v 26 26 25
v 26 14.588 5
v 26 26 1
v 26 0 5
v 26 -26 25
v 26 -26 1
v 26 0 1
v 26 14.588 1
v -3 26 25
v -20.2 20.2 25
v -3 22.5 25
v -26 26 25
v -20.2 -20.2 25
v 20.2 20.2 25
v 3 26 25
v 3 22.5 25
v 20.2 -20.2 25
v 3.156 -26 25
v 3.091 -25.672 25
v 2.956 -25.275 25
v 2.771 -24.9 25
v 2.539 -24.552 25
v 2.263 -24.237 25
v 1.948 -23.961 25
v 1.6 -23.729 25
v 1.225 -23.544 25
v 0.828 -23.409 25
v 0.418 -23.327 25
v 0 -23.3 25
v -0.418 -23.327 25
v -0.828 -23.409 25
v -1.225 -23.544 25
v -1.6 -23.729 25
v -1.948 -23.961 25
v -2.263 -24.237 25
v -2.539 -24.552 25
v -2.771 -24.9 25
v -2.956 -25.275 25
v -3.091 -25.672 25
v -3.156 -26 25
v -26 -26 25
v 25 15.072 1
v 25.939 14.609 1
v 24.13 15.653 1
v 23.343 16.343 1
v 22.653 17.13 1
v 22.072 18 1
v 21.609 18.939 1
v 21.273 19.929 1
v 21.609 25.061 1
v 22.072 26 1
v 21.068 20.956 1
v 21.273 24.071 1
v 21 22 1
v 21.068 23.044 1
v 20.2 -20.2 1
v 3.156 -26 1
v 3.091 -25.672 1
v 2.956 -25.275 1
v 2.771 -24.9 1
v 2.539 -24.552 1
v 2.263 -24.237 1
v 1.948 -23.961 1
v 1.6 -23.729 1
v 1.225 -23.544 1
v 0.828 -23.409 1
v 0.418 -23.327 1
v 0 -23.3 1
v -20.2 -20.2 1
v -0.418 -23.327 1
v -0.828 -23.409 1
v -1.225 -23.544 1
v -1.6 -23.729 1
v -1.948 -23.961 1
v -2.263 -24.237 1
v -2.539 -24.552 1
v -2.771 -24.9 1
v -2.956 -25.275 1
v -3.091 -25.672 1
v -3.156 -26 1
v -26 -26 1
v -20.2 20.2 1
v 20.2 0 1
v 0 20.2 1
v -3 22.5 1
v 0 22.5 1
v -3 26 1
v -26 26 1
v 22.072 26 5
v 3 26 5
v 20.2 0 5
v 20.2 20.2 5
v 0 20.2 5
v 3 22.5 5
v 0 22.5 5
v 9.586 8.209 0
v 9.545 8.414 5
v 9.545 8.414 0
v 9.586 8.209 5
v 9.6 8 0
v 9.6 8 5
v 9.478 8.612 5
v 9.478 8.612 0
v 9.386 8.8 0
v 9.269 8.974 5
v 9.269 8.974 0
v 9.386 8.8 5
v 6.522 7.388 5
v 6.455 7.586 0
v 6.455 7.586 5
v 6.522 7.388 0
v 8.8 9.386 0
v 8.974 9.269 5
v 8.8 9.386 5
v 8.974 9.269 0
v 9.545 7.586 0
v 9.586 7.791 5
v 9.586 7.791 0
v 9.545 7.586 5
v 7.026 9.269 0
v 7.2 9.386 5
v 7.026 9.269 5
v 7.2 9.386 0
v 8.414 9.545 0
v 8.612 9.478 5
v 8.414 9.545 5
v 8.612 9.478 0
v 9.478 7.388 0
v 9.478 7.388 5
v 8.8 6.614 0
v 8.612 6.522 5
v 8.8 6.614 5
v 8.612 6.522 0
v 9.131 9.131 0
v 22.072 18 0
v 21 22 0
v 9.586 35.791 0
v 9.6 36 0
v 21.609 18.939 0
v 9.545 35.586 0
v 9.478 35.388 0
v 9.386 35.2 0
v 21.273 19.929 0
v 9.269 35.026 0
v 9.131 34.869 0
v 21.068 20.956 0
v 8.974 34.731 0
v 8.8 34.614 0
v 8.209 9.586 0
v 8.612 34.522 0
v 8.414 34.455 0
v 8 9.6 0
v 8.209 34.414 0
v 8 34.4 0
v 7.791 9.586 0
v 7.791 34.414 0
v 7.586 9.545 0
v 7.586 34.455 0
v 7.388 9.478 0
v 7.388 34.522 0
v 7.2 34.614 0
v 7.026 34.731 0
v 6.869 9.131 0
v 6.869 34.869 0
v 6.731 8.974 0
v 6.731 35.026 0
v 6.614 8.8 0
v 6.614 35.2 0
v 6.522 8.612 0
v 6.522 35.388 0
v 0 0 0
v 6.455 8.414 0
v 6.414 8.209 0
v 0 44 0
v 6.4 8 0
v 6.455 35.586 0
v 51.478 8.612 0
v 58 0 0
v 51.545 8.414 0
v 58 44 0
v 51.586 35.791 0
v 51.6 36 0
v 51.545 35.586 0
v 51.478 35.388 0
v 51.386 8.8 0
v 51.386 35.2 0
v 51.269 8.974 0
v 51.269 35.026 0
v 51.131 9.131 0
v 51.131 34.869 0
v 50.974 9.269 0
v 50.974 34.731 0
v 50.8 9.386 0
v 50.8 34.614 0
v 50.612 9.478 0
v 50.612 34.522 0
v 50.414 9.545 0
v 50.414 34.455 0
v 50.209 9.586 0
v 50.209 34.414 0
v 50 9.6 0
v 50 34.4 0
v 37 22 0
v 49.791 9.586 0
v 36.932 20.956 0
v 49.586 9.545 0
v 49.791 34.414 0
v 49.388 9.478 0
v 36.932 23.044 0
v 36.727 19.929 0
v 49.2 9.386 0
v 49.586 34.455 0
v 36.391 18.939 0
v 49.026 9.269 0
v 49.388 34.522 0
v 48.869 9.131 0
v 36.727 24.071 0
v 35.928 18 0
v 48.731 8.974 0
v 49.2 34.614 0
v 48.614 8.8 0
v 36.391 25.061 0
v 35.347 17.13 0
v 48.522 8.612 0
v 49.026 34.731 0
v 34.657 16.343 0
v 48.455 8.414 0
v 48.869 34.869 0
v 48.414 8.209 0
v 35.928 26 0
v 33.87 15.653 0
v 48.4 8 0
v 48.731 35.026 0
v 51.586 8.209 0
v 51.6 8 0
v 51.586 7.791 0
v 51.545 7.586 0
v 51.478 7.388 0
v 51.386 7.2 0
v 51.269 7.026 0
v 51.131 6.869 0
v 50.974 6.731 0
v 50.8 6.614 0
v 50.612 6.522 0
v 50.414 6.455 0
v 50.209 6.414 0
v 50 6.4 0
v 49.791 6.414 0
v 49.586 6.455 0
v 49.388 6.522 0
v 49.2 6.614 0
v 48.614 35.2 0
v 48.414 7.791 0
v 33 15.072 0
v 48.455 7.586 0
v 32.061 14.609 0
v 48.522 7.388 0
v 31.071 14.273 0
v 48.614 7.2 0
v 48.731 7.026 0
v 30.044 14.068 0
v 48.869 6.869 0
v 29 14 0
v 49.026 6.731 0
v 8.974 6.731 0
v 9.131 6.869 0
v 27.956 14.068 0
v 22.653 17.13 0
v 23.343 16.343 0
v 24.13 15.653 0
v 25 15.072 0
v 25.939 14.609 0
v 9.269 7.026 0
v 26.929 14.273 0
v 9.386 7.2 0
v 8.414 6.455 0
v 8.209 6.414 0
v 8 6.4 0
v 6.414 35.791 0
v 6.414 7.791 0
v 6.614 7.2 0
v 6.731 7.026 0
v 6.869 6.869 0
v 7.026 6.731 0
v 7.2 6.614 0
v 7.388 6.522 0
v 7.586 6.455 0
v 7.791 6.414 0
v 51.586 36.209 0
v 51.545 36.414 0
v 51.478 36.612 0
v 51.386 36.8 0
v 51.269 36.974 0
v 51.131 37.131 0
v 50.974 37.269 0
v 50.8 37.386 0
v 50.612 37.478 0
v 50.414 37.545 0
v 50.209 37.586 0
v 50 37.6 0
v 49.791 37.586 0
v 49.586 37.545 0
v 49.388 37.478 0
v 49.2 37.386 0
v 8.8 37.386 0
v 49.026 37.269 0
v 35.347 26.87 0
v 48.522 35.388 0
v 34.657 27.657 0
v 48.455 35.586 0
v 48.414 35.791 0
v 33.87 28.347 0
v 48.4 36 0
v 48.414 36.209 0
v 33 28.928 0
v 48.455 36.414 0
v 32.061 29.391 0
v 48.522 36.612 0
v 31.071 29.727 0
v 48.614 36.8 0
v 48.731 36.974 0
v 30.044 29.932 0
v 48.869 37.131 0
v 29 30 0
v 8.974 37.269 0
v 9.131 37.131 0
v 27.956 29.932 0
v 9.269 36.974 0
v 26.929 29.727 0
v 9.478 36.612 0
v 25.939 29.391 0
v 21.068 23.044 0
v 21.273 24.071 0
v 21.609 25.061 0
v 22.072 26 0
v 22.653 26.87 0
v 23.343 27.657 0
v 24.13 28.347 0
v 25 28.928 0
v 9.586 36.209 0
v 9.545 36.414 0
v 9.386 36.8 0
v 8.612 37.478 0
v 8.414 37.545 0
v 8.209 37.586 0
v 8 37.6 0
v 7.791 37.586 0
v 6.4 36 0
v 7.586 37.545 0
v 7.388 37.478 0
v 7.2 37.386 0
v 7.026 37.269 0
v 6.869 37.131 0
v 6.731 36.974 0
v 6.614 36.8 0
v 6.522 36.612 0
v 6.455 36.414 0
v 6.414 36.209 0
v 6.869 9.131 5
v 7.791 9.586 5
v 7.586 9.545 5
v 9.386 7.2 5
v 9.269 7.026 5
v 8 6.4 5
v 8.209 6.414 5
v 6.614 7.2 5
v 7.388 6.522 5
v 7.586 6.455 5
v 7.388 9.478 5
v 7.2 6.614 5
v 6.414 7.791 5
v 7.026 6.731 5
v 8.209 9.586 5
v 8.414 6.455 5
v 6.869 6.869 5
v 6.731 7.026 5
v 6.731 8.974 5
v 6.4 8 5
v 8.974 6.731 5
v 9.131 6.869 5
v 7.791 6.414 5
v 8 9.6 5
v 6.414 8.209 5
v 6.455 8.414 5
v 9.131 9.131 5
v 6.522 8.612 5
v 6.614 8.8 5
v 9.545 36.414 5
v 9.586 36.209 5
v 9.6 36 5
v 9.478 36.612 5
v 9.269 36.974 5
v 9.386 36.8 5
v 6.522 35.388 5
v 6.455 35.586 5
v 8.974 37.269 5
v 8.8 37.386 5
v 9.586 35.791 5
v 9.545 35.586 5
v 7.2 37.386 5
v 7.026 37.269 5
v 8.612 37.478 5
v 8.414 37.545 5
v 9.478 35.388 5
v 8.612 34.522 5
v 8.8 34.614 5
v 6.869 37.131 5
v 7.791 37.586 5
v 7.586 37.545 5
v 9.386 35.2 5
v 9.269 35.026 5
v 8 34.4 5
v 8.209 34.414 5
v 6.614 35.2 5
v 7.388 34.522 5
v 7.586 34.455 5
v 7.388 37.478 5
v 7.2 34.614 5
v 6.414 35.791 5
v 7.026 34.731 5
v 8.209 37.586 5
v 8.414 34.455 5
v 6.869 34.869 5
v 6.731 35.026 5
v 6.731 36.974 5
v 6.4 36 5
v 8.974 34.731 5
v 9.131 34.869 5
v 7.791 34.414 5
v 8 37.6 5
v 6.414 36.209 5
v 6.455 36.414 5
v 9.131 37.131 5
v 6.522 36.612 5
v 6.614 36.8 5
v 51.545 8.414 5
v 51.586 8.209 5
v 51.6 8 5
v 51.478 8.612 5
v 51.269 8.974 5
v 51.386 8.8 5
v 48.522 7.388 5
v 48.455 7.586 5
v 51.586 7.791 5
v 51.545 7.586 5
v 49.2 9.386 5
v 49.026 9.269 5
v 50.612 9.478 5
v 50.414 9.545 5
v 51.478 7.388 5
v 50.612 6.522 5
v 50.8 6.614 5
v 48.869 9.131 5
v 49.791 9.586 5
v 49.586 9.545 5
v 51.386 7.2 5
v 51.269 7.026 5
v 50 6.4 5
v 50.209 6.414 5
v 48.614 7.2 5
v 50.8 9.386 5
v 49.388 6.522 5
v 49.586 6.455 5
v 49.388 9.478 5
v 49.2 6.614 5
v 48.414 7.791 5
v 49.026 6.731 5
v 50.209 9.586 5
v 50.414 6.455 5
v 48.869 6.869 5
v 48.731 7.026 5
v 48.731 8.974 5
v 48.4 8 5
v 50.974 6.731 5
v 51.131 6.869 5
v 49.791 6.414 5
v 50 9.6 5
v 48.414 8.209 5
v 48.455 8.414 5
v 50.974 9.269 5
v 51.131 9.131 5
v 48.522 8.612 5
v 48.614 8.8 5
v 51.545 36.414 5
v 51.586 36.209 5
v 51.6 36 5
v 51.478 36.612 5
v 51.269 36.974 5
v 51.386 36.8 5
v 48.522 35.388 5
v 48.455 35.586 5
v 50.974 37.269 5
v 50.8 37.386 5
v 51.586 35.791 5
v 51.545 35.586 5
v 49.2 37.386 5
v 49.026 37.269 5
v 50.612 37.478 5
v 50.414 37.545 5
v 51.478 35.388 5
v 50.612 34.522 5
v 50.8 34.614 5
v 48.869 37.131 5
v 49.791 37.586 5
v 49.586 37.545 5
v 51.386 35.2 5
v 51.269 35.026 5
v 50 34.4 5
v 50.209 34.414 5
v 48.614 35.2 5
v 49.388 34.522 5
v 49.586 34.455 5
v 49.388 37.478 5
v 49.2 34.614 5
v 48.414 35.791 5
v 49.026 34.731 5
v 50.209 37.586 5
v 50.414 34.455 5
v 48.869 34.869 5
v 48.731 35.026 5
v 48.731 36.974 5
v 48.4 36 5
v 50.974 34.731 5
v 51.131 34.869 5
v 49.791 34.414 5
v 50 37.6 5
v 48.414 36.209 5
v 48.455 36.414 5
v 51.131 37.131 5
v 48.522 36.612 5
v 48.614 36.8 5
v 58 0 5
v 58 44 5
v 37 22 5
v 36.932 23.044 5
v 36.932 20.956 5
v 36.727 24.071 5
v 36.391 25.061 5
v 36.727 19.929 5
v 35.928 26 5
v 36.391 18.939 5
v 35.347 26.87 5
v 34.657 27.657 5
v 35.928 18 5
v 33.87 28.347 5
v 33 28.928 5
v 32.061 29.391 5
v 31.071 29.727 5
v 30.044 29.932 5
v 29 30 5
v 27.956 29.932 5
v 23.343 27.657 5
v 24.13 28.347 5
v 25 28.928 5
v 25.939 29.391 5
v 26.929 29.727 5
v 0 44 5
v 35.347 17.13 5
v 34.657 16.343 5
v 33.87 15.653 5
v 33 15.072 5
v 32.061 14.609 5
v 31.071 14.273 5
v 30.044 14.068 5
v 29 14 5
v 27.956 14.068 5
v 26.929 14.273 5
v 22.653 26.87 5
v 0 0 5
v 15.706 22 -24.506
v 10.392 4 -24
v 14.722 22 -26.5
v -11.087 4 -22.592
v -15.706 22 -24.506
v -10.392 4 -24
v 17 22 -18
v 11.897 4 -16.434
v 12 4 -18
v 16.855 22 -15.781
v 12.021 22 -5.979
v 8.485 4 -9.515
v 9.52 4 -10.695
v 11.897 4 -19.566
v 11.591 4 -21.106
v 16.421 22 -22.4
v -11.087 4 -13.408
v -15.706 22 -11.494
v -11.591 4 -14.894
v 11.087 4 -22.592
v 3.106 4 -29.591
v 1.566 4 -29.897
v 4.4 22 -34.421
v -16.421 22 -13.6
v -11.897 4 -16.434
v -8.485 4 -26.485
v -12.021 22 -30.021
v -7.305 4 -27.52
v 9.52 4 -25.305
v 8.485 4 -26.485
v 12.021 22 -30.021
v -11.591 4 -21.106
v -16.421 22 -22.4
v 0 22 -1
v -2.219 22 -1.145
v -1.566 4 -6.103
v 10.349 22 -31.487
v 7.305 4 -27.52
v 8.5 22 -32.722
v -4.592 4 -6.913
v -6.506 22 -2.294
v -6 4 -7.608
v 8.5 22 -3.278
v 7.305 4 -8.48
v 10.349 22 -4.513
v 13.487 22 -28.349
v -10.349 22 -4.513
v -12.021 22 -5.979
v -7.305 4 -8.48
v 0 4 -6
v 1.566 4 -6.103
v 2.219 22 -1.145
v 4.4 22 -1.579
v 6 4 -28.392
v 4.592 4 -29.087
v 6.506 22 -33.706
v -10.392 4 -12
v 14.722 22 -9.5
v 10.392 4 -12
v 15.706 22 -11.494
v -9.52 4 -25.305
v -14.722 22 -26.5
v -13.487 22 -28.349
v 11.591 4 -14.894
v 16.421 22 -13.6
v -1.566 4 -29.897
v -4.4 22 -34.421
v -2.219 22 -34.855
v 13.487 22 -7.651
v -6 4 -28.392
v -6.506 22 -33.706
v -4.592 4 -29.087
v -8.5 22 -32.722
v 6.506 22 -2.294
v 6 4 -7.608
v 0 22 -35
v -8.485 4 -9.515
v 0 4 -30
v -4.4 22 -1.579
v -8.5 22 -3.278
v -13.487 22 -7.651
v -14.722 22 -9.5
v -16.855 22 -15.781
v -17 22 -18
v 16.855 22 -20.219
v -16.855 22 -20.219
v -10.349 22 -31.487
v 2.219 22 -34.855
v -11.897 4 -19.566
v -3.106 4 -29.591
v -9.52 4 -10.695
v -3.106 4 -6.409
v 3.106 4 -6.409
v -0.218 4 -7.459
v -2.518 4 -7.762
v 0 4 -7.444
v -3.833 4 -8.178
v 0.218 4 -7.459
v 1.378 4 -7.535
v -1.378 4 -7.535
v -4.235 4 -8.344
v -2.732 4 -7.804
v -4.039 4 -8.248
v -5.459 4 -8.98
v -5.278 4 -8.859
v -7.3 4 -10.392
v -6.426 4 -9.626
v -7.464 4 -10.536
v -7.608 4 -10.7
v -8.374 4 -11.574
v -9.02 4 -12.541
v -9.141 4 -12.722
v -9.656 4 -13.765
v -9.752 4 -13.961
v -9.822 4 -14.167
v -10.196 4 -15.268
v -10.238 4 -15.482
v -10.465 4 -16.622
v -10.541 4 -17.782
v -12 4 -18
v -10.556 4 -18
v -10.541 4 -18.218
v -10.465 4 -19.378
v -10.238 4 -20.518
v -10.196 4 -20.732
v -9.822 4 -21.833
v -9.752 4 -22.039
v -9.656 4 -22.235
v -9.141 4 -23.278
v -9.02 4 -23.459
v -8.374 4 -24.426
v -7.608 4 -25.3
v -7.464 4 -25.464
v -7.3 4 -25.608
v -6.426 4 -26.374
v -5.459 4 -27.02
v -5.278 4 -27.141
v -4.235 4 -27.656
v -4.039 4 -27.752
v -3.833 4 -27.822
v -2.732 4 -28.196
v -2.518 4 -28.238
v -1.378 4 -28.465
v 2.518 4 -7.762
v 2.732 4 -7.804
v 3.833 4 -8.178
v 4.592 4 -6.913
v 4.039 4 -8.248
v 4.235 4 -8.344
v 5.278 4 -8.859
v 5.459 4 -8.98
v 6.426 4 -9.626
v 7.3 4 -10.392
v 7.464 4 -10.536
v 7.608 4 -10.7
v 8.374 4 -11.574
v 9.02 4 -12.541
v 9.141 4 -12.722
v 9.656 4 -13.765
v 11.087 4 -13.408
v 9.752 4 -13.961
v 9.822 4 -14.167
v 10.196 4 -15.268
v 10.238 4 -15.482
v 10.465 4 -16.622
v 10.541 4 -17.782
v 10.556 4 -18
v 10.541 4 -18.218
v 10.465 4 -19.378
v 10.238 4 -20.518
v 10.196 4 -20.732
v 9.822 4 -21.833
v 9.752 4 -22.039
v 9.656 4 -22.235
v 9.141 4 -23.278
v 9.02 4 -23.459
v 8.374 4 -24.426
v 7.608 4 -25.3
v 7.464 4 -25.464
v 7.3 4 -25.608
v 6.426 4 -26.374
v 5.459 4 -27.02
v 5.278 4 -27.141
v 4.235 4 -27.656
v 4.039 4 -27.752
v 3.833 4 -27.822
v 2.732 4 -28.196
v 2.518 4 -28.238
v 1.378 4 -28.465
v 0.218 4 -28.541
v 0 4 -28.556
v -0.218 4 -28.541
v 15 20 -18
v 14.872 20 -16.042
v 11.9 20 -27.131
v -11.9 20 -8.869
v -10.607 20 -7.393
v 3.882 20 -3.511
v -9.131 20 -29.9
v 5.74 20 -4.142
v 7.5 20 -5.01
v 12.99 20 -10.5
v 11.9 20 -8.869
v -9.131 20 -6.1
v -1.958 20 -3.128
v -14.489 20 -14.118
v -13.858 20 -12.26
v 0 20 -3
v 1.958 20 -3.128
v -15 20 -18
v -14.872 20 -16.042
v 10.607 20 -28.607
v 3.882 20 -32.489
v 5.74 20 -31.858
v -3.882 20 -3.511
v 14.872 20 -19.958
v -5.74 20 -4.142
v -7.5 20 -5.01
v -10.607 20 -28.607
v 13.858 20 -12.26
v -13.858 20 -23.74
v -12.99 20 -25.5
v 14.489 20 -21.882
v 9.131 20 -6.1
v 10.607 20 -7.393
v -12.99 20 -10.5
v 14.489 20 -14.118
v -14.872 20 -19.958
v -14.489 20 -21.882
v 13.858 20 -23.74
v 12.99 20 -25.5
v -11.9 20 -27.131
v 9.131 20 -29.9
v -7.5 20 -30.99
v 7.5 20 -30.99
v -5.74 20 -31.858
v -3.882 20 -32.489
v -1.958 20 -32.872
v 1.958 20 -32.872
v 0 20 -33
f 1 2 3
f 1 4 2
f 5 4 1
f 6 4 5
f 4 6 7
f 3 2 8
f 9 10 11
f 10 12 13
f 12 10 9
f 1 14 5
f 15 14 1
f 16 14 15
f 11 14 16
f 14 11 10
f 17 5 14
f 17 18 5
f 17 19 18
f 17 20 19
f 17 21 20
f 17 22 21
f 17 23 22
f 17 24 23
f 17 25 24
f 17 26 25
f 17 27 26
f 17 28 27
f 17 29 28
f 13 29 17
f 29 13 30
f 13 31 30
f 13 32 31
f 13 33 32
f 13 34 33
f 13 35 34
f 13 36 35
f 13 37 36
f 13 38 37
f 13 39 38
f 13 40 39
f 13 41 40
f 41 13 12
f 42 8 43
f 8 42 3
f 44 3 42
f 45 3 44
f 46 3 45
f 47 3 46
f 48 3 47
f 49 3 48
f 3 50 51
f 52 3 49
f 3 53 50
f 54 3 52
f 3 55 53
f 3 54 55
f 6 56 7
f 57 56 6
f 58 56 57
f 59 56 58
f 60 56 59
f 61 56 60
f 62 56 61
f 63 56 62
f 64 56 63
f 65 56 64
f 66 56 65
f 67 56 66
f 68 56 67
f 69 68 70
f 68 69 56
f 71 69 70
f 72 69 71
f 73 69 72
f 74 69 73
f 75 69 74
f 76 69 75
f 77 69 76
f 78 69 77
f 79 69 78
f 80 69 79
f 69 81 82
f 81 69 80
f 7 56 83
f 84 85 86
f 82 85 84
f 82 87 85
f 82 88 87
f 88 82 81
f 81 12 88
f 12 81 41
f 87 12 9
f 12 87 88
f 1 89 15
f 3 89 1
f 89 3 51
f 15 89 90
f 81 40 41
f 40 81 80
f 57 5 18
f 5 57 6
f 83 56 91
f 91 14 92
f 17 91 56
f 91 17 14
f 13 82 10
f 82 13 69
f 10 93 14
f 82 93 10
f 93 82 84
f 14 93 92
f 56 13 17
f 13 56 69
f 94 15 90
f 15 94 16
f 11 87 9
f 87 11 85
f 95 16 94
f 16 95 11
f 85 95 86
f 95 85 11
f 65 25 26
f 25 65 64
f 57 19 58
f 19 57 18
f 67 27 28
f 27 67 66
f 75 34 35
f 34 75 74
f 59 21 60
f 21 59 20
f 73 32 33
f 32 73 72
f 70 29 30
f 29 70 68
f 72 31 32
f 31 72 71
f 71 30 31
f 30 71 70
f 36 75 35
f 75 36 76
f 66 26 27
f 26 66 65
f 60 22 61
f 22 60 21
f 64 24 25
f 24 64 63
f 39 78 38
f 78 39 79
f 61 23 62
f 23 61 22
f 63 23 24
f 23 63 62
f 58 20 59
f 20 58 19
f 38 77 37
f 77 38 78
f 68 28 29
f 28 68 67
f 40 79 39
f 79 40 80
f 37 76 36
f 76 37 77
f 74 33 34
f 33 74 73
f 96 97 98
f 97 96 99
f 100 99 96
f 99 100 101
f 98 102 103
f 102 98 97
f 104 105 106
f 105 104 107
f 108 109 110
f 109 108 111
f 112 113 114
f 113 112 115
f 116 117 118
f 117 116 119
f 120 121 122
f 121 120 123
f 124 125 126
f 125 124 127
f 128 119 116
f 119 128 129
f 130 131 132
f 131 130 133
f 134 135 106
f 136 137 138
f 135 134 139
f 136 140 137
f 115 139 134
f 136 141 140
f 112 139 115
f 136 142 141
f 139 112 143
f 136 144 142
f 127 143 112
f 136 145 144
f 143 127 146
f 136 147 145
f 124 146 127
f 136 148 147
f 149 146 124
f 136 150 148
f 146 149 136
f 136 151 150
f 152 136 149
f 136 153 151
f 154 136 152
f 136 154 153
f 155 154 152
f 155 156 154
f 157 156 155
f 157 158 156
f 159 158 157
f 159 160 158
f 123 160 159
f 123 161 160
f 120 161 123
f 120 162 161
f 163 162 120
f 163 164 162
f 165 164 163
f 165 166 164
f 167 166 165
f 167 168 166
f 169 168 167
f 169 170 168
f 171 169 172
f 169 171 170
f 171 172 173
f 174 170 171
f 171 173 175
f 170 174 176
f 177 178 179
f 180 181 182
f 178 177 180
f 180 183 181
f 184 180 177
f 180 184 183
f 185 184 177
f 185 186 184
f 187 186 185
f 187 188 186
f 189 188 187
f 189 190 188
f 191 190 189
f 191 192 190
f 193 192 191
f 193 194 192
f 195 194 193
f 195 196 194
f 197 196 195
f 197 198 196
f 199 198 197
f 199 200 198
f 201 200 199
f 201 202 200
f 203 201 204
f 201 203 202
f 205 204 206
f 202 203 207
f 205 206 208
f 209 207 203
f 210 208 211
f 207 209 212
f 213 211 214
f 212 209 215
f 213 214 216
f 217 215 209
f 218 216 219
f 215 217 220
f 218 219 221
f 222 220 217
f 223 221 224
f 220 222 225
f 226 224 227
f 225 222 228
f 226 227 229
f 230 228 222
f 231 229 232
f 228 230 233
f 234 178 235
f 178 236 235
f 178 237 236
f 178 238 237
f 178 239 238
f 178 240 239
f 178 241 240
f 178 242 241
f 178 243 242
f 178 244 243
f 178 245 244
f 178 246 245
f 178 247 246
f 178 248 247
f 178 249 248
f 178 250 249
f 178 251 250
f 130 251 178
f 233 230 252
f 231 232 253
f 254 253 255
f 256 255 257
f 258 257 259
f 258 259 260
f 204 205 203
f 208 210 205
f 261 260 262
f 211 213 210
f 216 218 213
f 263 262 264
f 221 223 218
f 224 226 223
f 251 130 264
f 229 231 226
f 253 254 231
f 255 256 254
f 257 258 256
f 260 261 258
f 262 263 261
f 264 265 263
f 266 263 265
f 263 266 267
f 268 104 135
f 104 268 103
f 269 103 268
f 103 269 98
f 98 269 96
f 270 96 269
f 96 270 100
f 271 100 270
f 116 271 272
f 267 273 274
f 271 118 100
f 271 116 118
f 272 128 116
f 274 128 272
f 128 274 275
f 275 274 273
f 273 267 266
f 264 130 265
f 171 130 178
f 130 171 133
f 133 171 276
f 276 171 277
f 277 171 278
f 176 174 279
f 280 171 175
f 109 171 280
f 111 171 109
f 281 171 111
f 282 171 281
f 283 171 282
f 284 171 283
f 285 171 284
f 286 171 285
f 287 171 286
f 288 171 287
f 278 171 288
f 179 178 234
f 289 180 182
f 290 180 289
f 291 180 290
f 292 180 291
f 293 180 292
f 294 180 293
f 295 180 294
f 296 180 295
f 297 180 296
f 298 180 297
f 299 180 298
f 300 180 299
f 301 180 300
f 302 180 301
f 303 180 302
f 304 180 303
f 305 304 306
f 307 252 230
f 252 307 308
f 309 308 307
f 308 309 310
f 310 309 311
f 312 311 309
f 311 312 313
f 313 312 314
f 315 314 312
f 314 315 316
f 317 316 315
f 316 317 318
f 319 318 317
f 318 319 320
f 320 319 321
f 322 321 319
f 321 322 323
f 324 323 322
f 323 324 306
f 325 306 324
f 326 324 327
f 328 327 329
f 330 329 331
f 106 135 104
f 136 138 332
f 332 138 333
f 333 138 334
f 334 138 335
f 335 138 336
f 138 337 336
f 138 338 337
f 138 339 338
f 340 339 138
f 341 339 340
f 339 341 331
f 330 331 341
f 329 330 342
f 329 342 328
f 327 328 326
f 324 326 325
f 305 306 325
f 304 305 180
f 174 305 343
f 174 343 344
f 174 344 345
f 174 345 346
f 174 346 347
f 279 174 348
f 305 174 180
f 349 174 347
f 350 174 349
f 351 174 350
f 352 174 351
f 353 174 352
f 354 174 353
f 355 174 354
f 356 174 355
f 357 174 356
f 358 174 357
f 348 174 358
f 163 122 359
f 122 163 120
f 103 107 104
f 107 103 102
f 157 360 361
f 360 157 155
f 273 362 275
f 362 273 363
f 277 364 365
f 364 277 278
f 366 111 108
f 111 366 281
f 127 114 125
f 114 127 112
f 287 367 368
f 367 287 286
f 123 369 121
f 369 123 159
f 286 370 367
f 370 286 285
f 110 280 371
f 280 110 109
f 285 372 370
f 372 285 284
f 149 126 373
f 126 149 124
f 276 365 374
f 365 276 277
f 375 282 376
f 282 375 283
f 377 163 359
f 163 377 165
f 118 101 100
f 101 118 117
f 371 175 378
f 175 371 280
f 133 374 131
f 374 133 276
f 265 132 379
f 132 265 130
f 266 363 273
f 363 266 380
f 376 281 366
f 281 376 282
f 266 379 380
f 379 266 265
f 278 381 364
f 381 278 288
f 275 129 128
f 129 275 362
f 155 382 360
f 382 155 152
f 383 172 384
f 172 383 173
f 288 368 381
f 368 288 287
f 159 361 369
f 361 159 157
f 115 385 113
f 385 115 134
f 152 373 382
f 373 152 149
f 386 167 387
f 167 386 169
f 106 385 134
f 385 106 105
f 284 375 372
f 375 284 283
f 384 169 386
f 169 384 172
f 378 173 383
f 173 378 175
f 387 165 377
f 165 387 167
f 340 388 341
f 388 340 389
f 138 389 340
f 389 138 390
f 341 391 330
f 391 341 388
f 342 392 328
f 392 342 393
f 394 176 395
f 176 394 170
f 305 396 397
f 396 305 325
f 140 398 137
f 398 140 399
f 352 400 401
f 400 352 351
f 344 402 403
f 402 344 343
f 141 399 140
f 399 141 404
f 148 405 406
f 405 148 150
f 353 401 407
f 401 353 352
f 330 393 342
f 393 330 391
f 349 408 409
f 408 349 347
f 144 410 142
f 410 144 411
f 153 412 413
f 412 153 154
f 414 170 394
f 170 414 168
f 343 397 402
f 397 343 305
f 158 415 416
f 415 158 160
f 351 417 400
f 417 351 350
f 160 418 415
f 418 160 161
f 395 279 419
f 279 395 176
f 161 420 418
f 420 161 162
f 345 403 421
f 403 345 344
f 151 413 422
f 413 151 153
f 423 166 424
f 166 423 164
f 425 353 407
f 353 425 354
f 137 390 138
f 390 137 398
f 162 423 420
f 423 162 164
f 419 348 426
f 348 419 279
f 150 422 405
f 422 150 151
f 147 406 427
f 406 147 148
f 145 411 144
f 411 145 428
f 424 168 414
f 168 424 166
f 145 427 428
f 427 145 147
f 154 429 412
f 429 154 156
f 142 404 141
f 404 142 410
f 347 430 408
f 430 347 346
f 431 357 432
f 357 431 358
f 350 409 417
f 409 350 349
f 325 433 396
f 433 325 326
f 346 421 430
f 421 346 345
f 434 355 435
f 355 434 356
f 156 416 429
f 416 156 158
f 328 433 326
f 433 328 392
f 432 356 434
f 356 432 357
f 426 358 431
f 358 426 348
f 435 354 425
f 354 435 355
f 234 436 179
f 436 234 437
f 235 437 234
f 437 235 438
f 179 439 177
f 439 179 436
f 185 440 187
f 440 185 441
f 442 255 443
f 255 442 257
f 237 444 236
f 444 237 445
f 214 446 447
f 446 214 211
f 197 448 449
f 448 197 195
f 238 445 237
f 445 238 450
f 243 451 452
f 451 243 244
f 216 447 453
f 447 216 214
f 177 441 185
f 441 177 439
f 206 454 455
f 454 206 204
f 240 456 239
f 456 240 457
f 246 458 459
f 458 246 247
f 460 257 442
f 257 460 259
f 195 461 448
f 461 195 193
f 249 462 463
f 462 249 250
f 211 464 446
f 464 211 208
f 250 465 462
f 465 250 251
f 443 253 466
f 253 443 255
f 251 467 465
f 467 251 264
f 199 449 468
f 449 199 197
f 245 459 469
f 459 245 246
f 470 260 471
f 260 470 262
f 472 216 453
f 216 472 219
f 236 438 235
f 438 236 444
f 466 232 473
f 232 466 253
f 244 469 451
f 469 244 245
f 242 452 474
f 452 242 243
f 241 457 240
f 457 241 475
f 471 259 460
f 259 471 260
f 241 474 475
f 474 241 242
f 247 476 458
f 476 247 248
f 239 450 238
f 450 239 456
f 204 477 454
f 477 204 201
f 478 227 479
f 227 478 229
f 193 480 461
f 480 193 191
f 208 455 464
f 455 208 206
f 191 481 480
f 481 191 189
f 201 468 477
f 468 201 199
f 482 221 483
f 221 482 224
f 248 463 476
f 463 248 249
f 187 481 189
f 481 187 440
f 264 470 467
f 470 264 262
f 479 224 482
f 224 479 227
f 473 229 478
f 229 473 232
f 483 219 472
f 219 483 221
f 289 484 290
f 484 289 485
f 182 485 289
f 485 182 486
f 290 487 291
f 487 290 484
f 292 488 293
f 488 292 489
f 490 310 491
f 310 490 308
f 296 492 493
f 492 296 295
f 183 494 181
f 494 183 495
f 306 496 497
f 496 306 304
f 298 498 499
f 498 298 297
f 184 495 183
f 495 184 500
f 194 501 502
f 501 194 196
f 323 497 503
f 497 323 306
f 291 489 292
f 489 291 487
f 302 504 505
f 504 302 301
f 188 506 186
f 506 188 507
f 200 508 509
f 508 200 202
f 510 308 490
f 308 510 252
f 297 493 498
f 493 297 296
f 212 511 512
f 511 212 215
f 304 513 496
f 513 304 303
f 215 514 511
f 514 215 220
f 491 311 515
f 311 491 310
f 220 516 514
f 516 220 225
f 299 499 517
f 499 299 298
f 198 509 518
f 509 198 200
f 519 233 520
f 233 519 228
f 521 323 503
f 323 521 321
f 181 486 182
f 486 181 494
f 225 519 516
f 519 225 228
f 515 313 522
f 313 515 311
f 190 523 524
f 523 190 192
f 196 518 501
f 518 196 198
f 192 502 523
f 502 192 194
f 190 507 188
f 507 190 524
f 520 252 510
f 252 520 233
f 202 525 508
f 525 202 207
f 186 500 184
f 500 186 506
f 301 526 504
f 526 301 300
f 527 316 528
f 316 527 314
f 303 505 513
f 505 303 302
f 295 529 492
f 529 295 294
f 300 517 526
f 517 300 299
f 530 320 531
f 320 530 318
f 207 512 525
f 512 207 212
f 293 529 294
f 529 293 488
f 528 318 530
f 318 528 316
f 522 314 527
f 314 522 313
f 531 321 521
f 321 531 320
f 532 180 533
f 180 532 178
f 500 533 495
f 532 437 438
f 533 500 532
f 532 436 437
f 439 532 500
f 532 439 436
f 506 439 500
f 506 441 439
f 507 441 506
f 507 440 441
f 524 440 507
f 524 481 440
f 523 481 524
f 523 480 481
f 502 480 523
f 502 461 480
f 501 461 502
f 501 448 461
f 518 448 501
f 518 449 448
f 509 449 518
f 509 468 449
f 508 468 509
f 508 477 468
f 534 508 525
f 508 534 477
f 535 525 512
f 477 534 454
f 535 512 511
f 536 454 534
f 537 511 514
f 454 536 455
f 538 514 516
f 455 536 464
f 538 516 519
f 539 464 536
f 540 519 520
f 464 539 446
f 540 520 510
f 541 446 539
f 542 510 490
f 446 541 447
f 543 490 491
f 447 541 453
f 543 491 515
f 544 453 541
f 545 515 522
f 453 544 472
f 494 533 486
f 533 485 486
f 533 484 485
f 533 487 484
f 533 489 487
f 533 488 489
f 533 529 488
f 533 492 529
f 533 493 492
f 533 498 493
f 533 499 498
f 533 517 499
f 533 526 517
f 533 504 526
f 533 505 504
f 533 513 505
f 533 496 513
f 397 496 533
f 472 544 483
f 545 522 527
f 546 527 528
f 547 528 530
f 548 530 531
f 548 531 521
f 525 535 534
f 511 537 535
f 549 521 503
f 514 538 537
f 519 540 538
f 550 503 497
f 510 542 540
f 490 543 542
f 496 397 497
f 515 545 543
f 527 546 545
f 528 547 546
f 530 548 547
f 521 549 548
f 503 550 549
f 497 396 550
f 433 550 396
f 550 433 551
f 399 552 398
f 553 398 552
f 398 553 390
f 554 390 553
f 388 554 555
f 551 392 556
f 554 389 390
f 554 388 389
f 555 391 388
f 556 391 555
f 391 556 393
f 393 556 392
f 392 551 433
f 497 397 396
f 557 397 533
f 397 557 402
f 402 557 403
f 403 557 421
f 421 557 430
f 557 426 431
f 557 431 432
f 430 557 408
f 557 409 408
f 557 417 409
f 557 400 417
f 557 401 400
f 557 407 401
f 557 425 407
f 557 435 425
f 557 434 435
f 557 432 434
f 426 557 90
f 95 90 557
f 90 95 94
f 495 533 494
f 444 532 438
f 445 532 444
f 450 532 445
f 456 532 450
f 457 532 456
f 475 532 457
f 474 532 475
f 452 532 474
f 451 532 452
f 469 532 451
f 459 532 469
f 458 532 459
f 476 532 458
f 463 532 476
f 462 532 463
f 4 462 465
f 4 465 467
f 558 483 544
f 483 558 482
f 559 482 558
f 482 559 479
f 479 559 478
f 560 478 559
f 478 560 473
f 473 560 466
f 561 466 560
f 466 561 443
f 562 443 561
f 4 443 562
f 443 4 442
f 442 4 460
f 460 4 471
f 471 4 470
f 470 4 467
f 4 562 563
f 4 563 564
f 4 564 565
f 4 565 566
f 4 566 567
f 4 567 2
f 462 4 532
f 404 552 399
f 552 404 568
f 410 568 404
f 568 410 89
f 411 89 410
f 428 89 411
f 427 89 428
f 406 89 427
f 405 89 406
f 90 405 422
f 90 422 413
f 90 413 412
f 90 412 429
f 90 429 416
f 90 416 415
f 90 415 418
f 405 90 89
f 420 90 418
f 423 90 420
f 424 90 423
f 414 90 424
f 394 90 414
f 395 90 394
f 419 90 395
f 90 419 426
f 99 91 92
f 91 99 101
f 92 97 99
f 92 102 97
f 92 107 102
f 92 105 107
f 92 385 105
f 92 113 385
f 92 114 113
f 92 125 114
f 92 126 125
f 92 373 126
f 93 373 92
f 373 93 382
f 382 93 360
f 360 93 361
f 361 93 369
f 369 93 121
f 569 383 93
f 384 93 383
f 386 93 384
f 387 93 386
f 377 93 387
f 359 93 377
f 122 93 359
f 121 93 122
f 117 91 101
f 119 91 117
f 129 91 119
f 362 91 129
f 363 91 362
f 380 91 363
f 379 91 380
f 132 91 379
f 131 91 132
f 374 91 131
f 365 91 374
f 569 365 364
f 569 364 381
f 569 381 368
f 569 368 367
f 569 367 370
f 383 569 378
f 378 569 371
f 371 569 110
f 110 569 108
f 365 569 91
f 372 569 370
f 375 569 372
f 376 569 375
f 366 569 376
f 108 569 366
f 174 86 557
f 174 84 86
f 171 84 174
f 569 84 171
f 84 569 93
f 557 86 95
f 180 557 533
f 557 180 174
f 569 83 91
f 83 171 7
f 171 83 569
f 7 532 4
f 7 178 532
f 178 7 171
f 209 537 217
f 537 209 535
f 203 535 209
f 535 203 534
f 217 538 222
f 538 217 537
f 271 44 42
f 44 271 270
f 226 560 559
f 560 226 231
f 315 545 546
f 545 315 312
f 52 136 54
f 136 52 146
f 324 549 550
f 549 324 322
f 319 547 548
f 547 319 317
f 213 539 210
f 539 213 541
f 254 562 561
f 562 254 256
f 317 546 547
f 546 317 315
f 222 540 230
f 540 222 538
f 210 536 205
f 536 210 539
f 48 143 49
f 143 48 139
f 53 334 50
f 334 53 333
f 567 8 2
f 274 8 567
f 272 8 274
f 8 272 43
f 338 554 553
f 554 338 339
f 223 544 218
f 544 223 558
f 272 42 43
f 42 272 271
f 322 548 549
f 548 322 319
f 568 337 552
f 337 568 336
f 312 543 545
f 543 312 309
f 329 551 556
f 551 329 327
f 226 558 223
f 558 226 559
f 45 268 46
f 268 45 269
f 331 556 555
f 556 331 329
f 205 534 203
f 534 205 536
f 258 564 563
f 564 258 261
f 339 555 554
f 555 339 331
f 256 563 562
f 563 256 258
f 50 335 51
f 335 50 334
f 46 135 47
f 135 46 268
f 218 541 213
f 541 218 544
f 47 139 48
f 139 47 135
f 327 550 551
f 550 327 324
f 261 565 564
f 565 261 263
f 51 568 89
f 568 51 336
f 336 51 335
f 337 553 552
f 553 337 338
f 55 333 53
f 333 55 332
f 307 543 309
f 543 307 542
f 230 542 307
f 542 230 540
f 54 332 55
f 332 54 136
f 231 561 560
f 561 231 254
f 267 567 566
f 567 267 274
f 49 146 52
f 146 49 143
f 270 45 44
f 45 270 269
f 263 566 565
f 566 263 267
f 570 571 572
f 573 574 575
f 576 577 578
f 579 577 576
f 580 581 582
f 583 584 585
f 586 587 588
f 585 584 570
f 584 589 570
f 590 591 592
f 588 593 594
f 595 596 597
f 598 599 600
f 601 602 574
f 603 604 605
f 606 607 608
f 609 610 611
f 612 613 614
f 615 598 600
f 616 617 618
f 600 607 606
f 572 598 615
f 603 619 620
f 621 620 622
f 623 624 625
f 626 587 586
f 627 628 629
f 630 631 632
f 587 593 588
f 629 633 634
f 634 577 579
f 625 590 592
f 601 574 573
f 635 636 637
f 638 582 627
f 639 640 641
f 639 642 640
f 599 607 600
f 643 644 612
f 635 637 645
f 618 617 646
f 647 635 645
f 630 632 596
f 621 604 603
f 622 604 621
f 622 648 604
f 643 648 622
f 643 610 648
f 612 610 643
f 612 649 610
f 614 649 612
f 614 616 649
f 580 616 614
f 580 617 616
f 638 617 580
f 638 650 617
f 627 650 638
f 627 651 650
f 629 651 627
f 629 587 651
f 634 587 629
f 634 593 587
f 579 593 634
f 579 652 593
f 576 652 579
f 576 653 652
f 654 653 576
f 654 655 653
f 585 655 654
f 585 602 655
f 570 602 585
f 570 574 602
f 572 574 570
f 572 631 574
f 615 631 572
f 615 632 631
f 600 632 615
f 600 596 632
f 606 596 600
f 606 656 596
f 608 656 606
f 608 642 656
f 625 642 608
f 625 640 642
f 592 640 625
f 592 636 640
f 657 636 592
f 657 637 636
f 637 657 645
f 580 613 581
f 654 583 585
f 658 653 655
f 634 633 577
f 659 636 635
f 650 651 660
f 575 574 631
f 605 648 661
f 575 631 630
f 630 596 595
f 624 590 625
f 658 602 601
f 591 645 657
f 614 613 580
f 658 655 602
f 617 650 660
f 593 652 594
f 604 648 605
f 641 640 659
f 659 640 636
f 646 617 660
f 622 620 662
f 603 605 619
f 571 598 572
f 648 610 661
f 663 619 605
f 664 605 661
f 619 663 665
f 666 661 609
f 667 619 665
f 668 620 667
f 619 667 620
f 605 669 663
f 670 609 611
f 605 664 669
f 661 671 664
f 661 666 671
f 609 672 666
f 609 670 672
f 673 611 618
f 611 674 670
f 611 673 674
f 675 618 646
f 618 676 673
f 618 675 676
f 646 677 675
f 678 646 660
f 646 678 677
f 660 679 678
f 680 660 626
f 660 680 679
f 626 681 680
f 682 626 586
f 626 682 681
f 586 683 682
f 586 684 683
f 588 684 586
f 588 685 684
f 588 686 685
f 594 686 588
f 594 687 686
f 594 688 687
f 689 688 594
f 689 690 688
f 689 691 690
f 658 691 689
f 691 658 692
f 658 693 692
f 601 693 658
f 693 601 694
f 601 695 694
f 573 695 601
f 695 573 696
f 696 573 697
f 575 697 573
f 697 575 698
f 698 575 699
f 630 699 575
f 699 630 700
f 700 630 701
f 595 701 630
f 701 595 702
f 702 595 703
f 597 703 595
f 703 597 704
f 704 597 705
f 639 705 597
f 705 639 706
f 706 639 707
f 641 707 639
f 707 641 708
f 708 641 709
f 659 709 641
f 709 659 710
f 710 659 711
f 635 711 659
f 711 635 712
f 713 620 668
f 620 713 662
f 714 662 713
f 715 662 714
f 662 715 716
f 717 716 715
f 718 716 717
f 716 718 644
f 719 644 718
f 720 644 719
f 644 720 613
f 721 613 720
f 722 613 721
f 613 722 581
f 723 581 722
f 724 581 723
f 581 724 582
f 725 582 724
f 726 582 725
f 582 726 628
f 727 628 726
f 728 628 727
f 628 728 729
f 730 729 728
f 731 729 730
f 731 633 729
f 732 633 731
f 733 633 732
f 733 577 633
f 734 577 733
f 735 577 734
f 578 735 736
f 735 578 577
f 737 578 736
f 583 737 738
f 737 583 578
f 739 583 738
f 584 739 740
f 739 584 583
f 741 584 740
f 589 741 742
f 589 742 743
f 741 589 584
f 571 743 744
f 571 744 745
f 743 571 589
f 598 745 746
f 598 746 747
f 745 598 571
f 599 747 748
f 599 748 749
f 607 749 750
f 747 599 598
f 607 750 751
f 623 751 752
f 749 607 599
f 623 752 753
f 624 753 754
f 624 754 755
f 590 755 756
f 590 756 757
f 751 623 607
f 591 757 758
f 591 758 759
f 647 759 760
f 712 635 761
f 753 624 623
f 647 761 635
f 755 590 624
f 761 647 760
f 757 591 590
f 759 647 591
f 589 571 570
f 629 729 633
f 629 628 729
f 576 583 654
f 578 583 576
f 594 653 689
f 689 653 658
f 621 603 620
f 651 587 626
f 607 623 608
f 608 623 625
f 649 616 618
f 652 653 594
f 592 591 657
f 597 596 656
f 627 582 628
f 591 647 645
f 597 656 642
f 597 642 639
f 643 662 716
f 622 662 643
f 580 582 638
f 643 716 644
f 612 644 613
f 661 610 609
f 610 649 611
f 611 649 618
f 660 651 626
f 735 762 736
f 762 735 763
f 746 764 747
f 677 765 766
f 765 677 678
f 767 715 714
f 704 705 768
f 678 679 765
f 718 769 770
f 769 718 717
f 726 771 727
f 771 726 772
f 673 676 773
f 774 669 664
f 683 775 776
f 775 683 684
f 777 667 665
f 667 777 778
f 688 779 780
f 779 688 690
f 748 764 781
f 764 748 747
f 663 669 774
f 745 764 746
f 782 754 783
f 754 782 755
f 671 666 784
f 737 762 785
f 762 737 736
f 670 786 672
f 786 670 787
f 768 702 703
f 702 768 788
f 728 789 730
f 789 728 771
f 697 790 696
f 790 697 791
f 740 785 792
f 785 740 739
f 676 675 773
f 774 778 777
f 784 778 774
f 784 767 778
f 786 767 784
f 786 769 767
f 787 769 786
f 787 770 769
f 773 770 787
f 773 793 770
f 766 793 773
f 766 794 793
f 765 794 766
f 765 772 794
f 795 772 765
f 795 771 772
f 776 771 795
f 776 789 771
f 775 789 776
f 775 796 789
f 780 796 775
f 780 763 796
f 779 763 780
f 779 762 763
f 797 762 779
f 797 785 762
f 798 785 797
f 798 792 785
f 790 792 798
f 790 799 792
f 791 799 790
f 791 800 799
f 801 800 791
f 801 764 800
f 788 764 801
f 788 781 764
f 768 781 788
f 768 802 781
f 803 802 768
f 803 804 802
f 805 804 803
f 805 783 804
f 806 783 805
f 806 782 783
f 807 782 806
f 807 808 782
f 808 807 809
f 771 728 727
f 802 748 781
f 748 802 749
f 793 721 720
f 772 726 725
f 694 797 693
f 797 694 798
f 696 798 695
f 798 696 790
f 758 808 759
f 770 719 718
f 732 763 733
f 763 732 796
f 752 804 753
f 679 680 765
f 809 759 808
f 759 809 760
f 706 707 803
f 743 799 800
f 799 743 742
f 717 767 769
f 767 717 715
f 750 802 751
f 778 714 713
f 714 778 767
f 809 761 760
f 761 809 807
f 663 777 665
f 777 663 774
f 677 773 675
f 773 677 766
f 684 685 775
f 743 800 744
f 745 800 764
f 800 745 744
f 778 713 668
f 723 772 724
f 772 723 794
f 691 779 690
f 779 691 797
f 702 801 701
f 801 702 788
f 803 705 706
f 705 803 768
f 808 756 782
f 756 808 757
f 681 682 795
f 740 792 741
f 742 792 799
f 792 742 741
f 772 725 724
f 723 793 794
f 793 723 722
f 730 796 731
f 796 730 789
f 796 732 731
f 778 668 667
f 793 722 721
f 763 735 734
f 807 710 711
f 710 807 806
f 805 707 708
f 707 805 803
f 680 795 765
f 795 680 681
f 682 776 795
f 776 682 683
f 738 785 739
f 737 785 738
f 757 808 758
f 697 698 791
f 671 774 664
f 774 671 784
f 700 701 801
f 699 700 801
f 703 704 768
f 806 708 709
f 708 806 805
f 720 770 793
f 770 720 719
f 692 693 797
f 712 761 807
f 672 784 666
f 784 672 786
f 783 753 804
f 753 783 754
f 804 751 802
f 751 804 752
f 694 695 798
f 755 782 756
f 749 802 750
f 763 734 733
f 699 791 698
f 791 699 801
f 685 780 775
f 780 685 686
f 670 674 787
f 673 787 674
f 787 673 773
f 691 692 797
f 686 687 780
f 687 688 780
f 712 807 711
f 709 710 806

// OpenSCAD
// АГРОСПЕКТР-К. Кронштейн камерного блока съёмочной штанги.
// Печать: ПЭТГ, заполнение 40 %, сопло 0,4 мм. Проверено на макете.
$fn = 48;

module clamp() {           // хомут на трубу штанги 40×40 мм
  difference() {
    cube([52, 52, 24], center = true);
    translate([0, 0, 0]) cube([40.4, 40.4, 26], center = true);
    translate([0, 26.5, 0]) cube([6, 8, 26], center = true); // стяжной паз
    translate([0, -26.5, 0]) cylinder(d = 6.4, h = 28, center = true); // болт М6
  }
}

module cam_plate() {       // плата камерного модуля
  difference() {
    cube([58, 44, 5]);
    for (x = [8, 50]) for (y = [8, 36])
      translate([x, y, 0]) cylinder(d = 3.2, h = 6);
    translate([29, 22, 0]) cylinder(d = 16, h = 6); // окно объектива
  }
}

module hood() {            // бленда от засветки и пыли
  difference() {
    cylinder(d1 = 34, d2 = 24, h = 18);
    translate([0, 0, 2]) cylinder(d1 = 30, d2 = 20, h = 18);
  }
}

translate([0, 0, 13]) clamp();
translate([0, 0, 0]) cam_plate();
translate([0, 22, -18]) rotate([90, 0, 0]) hood();
// Итог: блок 58×44×55 мм, масса печати 38 г, юстировка по пазам штанги.
